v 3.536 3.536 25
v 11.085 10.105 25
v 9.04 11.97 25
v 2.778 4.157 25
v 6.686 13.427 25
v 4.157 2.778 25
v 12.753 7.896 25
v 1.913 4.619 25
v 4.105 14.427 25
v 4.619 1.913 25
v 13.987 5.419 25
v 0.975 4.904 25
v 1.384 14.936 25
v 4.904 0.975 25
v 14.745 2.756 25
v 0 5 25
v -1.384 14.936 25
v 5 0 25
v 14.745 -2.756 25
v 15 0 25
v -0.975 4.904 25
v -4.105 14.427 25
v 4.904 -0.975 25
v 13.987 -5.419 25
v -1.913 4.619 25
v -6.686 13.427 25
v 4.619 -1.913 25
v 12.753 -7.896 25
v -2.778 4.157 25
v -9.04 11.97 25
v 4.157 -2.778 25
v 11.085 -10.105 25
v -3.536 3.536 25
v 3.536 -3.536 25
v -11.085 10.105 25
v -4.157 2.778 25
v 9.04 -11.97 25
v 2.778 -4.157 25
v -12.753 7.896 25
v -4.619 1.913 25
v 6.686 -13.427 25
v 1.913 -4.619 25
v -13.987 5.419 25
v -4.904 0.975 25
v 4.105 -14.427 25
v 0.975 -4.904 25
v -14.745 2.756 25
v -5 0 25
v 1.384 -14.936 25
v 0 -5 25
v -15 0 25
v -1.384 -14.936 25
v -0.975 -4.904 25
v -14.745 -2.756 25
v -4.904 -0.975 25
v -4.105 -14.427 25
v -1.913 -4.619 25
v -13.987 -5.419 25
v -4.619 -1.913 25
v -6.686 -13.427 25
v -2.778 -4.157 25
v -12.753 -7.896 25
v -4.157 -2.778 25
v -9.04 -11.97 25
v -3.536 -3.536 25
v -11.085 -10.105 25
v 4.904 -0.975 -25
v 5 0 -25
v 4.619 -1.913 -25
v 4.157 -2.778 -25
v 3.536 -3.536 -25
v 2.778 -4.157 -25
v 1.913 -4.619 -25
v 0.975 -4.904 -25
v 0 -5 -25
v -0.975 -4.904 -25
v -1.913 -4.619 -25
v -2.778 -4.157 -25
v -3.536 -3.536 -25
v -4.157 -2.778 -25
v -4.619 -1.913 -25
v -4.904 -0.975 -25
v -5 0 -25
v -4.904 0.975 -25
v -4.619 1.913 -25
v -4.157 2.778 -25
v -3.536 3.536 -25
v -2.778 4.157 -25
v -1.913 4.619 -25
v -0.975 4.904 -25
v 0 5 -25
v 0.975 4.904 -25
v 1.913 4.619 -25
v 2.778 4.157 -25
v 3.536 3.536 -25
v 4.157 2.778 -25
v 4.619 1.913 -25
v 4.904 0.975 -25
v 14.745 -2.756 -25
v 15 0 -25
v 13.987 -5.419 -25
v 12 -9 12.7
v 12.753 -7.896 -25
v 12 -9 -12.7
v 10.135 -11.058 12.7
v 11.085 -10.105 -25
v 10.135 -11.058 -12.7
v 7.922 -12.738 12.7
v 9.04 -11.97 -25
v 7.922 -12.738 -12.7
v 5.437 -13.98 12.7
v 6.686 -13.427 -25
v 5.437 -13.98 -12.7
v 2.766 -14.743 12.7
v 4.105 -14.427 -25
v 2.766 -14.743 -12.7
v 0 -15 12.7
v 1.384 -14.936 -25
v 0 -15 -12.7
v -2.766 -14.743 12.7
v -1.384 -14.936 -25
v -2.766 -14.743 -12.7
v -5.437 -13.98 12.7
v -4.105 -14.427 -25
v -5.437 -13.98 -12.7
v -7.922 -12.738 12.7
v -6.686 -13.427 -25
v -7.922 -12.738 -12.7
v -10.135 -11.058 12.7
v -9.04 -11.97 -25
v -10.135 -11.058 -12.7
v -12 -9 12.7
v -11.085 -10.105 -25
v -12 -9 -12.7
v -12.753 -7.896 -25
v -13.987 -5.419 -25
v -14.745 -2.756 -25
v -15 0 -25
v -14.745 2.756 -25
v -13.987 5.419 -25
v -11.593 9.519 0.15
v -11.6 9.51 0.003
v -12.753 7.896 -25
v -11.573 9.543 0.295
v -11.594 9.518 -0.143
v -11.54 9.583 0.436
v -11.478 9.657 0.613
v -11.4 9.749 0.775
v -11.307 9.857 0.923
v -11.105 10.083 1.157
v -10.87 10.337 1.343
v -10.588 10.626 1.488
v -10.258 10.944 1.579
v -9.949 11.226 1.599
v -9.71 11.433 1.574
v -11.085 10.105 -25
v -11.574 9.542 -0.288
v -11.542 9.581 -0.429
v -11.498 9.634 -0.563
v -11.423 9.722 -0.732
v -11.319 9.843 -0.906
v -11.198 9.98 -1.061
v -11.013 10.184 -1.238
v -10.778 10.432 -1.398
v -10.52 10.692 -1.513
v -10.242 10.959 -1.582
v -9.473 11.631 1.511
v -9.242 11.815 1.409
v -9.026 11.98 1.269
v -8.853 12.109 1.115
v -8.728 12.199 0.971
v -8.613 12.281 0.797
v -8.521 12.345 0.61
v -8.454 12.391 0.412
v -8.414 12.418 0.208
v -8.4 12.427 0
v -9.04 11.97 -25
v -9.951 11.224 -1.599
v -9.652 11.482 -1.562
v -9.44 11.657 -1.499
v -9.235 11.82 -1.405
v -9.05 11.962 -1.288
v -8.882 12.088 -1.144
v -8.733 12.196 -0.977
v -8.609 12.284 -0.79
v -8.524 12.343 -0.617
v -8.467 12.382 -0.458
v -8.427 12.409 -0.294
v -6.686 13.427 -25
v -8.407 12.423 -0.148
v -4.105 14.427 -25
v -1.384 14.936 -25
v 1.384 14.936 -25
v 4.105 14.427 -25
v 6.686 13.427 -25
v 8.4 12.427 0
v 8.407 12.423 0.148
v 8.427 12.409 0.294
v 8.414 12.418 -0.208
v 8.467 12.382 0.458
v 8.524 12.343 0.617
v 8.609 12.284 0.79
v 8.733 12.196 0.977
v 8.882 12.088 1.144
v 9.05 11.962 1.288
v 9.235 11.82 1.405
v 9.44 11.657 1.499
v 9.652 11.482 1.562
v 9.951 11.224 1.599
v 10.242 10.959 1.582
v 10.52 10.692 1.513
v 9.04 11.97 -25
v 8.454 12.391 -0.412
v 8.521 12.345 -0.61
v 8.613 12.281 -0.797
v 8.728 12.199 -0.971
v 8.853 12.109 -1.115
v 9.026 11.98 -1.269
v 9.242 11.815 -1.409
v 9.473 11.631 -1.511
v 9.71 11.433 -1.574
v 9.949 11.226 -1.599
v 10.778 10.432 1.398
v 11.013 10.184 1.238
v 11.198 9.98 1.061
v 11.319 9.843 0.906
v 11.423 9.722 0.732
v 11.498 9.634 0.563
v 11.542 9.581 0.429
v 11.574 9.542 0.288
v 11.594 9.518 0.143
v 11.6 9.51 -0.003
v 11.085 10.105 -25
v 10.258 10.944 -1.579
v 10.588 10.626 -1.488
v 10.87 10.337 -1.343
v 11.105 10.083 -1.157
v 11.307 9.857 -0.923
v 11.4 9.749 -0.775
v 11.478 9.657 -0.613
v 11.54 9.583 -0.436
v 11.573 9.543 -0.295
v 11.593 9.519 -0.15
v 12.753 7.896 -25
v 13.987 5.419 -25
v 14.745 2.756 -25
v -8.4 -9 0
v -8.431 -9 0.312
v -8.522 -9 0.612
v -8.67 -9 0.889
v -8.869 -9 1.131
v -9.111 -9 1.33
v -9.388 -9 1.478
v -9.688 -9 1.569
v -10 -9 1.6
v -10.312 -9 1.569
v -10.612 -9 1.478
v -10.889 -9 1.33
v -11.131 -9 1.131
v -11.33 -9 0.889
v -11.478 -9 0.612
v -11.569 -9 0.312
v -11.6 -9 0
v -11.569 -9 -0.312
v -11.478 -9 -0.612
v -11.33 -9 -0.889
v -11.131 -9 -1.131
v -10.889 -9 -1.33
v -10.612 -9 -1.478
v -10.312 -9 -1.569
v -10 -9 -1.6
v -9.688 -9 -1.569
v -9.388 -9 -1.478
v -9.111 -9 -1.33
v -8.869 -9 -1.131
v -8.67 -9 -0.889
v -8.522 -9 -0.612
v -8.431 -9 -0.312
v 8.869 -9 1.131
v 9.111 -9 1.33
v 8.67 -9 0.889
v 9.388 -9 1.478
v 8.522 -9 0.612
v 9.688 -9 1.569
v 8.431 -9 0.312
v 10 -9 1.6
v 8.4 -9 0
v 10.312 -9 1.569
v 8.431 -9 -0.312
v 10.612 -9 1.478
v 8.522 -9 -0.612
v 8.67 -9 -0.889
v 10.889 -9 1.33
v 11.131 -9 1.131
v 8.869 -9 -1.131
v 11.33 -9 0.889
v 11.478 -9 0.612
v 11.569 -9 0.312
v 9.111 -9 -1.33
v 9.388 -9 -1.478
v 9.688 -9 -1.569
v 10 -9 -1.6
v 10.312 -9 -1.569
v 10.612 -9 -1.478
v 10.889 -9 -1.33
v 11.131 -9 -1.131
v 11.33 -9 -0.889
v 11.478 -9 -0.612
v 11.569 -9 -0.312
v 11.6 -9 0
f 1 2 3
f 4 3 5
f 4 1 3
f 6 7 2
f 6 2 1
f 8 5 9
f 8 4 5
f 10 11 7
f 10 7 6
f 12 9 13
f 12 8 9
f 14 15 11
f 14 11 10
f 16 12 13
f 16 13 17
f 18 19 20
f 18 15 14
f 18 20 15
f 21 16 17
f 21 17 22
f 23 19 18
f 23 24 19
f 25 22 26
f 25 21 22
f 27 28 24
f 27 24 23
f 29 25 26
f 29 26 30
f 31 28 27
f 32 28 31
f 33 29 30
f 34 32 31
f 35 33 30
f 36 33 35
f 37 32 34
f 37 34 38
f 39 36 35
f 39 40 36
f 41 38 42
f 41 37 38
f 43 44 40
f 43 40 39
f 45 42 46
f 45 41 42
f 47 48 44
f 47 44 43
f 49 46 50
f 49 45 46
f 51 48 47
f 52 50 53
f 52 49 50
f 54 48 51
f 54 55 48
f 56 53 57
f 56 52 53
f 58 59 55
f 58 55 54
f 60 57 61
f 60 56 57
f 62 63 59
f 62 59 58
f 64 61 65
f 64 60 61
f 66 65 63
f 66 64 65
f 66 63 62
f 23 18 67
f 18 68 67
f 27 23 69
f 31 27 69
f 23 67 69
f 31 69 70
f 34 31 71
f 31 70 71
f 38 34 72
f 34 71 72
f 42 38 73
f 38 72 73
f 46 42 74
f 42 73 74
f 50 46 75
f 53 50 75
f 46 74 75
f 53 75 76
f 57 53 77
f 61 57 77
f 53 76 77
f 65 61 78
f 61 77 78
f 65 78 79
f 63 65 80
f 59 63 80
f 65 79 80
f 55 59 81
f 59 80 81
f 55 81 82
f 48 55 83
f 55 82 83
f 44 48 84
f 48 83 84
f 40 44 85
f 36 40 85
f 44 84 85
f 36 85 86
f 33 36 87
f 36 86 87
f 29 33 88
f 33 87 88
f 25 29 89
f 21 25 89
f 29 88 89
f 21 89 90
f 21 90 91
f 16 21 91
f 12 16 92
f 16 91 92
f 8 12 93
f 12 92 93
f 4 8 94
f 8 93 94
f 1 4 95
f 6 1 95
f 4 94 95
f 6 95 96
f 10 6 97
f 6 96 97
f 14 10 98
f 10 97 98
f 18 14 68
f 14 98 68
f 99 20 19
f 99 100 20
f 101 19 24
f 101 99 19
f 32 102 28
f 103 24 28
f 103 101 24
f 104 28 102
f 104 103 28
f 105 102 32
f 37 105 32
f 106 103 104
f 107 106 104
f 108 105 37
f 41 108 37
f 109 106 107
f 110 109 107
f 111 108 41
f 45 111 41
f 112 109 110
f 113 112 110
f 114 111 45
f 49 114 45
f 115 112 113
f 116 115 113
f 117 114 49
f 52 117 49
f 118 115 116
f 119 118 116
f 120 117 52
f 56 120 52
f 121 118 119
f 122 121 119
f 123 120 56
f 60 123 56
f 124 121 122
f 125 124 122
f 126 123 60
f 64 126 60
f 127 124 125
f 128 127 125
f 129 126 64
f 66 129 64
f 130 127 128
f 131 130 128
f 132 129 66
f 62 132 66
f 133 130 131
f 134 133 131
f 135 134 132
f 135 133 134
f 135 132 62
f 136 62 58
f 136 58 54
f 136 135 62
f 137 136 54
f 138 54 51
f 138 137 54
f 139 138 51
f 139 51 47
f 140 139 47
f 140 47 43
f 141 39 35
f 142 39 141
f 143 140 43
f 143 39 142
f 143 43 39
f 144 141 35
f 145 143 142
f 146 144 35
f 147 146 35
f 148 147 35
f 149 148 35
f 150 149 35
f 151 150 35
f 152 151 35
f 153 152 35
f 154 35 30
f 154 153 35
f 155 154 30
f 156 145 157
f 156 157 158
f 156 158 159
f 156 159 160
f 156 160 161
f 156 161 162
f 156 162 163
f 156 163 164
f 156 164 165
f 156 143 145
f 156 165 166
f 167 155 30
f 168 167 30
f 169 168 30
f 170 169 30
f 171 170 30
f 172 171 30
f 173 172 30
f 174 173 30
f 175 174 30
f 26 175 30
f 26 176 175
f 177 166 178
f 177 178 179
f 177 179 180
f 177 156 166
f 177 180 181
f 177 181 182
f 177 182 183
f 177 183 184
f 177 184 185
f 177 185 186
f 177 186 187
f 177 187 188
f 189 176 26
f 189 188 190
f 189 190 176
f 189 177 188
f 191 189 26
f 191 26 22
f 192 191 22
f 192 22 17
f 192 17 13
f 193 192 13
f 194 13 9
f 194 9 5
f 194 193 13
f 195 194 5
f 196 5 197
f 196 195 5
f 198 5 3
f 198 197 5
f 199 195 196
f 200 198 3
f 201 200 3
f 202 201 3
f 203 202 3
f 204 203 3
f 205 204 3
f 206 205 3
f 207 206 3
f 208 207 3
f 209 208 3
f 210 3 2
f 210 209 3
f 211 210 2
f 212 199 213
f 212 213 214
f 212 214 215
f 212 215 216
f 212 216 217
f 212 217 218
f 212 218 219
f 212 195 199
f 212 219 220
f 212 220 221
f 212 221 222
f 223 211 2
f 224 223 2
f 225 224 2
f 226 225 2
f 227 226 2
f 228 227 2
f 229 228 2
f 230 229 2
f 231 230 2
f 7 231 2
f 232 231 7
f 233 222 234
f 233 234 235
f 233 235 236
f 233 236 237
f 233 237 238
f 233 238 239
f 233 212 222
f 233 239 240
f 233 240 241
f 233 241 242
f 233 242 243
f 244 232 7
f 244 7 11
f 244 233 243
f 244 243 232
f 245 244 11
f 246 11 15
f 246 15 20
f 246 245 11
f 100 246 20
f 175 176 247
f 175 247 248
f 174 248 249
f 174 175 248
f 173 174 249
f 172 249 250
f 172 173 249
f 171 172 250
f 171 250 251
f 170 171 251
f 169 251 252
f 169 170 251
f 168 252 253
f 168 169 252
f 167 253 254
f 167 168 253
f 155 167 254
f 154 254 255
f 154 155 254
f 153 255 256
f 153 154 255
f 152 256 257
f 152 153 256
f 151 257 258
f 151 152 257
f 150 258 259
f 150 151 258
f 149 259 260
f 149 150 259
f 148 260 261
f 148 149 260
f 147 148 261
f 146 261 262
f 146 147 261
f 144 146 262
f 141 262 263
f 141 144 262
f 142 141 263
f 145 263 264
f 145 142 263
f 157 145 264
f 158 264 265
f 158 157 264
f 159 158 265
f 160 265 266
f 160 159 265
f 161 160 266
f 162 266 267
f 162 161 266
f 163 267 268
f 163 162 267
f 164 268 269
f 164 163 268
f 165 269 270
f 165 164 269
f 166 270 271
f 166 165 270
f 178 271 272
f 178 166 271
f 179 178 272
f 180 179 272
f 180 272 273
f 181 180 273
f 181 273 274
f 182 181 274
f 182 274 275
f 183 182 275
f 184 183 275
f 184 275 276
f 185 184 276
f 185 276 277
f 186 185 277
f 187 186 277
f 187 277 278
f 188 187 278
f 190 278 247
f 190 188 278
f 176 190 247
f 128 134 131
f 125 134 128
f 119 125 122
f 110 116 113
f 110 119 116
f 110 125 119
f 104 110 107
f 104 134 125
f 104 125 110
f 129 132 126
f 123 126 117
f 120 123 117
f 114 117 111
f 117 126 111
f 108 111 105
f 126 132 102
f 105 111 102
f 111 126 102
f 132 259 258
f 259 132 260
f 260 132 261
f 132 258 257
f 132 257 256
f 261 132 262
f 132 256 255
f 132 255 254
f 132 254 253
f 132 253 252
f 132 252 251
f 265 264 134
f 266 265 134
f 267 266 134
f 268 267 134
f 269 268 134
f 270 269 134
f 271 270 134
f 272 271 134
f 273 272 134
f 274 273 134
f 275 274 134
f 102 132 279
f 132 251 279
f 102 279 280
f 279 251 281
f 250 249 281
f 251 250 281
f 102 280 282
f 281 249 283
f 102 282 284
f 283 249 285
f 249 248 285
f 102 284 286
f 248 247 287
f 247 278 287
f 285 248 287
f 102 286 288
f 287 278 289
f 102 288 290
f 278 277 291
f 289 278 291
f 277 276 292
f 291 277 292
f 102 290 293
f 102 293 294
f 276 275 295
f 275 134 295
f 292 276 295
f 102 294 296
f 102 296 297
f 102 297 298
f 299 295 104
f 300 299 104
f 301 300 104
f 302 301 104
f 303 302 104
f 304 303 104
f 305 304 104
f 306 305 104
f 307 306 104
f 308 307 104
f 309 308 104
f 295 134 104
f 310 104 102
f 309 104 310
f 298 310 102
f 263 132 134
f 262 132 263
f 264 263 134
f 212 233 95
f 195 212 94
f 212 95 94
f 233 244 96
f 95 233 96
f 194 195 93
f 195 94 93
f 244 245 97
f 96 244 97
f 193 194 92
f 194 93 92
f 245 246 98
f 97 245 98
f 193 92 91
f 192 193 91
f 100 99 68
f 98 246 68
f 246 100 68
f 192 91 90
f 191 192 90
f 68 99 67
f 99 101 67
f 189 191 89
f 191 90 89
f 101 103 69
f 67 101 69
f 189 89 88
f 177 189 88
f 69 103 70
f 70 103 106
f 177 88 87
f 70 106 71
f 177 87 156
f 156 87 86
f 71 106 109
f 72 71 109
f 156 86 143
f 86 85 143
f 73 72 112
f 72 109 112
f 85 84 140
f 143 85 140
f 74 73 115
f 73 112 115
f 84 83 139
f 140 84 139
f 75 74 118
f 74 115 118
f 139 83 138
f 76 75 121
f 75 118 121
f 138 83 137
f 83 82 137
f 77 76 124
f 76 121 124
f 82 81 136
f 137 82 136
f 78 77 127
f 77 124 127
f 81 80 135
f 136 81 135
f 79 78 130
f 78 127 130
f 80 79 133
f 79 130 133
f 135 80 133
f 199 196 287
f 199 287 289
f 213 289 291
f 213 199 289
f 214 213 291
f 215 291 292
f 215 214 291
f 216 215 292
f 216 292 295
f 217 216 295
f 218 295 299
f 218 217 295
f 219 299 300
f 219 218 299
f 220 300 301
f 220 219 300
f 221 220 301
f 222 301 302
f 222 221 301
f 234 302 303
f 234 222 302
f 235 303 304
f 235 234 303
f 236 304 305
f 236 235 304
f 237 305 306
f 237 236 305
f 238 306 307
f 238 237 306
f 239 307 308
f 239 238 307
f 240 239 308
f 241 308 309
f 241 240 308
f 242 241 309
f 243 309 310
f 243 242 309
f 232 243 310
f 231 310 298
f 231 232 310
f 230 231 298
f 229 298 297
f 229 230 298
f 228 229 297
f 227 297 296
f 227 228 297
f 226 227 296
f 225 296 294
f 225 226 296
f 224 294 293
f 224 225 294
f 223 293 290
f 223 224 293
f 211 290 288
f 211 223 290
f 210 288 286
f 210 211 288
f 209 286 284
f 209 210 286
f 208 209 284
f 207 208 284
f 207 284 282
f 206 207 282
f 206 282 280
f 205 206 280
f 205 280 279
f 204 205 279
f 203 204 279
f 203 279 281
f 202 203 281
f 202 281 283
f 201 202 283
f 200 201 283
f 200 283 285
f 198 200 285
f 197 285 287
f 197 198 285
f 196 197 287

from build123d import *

# Parameters (mm, degrees)
SKETCH1_W               = 10
SKETCH1_H               = 50
CUT_EXTRUDE1_DEPTH      = 12.7
CUT_EXTRUDE1_DEPTH_BACK = 12.7
SKETCH2_W               = 30
SKETCH2_H               = 6
SKETCH3_W               = 1.6
SKETCH3_H               = 21.427389106
SKETCH3_3_W             = 1.6
SKETCH3_3_H             = 21.427389106


with BuildPart() as part:
    # Sketch1 → Revolve1 (revolve)
    with BuildSketch(Plane(origin=(0, 0, 0), x_dir=(1, 0, 0), z_dir=(0, 1, 0))):
        with Locations((10, 0)):
            Rectangle(SKETCH1_W, SKETCH1_H)
    revolve(axis=Axis((0, 0, 25), (0, 0, -1)))

    # Sketch2 → Cut-Extrude1 (cut, two sides: drawn at the far end of the back side and taken through both)
    with BuildSketch(Plane.XY.offset(-CUT_EXTRUDE1_DEPTH_BACK)):
        with Locations((0, -12)):
            Rectangle(SKETCH2_W, SKETCH2_H)
    extrude(amount=CUT_EXTRUDE1_DEPTH + CUT_EXTRUDE1_DEPTH_BACK, mode=Mode.SUBTRACT)

    # Sketch3 → Cut-Revolve1 (revolve, cut)
    with BuildSketch(Plane.XY):
        with Locations((9.2, 1.713694553)):
            Rectangle(SKETCH3_W, SKETCH3_H)
    revolve(axis=Axis((10, -9, 0), (0, -1, 0)), mode=Mode.SUBTRACT)

    # Sketch3<3> → Cut-Revolve2 (revolve, cut)
    with BuildSketch(Plane.XY):
        with Locations((-9.2, 1.713694553)):
            Rectangle(SKETCH3_3_W, SKETCH3_3_H)
    revolve(axis=Axis((-10, -9, 0), (0, -1, 0)), mode=Mode.SUBTRACT)


solid = part.part
